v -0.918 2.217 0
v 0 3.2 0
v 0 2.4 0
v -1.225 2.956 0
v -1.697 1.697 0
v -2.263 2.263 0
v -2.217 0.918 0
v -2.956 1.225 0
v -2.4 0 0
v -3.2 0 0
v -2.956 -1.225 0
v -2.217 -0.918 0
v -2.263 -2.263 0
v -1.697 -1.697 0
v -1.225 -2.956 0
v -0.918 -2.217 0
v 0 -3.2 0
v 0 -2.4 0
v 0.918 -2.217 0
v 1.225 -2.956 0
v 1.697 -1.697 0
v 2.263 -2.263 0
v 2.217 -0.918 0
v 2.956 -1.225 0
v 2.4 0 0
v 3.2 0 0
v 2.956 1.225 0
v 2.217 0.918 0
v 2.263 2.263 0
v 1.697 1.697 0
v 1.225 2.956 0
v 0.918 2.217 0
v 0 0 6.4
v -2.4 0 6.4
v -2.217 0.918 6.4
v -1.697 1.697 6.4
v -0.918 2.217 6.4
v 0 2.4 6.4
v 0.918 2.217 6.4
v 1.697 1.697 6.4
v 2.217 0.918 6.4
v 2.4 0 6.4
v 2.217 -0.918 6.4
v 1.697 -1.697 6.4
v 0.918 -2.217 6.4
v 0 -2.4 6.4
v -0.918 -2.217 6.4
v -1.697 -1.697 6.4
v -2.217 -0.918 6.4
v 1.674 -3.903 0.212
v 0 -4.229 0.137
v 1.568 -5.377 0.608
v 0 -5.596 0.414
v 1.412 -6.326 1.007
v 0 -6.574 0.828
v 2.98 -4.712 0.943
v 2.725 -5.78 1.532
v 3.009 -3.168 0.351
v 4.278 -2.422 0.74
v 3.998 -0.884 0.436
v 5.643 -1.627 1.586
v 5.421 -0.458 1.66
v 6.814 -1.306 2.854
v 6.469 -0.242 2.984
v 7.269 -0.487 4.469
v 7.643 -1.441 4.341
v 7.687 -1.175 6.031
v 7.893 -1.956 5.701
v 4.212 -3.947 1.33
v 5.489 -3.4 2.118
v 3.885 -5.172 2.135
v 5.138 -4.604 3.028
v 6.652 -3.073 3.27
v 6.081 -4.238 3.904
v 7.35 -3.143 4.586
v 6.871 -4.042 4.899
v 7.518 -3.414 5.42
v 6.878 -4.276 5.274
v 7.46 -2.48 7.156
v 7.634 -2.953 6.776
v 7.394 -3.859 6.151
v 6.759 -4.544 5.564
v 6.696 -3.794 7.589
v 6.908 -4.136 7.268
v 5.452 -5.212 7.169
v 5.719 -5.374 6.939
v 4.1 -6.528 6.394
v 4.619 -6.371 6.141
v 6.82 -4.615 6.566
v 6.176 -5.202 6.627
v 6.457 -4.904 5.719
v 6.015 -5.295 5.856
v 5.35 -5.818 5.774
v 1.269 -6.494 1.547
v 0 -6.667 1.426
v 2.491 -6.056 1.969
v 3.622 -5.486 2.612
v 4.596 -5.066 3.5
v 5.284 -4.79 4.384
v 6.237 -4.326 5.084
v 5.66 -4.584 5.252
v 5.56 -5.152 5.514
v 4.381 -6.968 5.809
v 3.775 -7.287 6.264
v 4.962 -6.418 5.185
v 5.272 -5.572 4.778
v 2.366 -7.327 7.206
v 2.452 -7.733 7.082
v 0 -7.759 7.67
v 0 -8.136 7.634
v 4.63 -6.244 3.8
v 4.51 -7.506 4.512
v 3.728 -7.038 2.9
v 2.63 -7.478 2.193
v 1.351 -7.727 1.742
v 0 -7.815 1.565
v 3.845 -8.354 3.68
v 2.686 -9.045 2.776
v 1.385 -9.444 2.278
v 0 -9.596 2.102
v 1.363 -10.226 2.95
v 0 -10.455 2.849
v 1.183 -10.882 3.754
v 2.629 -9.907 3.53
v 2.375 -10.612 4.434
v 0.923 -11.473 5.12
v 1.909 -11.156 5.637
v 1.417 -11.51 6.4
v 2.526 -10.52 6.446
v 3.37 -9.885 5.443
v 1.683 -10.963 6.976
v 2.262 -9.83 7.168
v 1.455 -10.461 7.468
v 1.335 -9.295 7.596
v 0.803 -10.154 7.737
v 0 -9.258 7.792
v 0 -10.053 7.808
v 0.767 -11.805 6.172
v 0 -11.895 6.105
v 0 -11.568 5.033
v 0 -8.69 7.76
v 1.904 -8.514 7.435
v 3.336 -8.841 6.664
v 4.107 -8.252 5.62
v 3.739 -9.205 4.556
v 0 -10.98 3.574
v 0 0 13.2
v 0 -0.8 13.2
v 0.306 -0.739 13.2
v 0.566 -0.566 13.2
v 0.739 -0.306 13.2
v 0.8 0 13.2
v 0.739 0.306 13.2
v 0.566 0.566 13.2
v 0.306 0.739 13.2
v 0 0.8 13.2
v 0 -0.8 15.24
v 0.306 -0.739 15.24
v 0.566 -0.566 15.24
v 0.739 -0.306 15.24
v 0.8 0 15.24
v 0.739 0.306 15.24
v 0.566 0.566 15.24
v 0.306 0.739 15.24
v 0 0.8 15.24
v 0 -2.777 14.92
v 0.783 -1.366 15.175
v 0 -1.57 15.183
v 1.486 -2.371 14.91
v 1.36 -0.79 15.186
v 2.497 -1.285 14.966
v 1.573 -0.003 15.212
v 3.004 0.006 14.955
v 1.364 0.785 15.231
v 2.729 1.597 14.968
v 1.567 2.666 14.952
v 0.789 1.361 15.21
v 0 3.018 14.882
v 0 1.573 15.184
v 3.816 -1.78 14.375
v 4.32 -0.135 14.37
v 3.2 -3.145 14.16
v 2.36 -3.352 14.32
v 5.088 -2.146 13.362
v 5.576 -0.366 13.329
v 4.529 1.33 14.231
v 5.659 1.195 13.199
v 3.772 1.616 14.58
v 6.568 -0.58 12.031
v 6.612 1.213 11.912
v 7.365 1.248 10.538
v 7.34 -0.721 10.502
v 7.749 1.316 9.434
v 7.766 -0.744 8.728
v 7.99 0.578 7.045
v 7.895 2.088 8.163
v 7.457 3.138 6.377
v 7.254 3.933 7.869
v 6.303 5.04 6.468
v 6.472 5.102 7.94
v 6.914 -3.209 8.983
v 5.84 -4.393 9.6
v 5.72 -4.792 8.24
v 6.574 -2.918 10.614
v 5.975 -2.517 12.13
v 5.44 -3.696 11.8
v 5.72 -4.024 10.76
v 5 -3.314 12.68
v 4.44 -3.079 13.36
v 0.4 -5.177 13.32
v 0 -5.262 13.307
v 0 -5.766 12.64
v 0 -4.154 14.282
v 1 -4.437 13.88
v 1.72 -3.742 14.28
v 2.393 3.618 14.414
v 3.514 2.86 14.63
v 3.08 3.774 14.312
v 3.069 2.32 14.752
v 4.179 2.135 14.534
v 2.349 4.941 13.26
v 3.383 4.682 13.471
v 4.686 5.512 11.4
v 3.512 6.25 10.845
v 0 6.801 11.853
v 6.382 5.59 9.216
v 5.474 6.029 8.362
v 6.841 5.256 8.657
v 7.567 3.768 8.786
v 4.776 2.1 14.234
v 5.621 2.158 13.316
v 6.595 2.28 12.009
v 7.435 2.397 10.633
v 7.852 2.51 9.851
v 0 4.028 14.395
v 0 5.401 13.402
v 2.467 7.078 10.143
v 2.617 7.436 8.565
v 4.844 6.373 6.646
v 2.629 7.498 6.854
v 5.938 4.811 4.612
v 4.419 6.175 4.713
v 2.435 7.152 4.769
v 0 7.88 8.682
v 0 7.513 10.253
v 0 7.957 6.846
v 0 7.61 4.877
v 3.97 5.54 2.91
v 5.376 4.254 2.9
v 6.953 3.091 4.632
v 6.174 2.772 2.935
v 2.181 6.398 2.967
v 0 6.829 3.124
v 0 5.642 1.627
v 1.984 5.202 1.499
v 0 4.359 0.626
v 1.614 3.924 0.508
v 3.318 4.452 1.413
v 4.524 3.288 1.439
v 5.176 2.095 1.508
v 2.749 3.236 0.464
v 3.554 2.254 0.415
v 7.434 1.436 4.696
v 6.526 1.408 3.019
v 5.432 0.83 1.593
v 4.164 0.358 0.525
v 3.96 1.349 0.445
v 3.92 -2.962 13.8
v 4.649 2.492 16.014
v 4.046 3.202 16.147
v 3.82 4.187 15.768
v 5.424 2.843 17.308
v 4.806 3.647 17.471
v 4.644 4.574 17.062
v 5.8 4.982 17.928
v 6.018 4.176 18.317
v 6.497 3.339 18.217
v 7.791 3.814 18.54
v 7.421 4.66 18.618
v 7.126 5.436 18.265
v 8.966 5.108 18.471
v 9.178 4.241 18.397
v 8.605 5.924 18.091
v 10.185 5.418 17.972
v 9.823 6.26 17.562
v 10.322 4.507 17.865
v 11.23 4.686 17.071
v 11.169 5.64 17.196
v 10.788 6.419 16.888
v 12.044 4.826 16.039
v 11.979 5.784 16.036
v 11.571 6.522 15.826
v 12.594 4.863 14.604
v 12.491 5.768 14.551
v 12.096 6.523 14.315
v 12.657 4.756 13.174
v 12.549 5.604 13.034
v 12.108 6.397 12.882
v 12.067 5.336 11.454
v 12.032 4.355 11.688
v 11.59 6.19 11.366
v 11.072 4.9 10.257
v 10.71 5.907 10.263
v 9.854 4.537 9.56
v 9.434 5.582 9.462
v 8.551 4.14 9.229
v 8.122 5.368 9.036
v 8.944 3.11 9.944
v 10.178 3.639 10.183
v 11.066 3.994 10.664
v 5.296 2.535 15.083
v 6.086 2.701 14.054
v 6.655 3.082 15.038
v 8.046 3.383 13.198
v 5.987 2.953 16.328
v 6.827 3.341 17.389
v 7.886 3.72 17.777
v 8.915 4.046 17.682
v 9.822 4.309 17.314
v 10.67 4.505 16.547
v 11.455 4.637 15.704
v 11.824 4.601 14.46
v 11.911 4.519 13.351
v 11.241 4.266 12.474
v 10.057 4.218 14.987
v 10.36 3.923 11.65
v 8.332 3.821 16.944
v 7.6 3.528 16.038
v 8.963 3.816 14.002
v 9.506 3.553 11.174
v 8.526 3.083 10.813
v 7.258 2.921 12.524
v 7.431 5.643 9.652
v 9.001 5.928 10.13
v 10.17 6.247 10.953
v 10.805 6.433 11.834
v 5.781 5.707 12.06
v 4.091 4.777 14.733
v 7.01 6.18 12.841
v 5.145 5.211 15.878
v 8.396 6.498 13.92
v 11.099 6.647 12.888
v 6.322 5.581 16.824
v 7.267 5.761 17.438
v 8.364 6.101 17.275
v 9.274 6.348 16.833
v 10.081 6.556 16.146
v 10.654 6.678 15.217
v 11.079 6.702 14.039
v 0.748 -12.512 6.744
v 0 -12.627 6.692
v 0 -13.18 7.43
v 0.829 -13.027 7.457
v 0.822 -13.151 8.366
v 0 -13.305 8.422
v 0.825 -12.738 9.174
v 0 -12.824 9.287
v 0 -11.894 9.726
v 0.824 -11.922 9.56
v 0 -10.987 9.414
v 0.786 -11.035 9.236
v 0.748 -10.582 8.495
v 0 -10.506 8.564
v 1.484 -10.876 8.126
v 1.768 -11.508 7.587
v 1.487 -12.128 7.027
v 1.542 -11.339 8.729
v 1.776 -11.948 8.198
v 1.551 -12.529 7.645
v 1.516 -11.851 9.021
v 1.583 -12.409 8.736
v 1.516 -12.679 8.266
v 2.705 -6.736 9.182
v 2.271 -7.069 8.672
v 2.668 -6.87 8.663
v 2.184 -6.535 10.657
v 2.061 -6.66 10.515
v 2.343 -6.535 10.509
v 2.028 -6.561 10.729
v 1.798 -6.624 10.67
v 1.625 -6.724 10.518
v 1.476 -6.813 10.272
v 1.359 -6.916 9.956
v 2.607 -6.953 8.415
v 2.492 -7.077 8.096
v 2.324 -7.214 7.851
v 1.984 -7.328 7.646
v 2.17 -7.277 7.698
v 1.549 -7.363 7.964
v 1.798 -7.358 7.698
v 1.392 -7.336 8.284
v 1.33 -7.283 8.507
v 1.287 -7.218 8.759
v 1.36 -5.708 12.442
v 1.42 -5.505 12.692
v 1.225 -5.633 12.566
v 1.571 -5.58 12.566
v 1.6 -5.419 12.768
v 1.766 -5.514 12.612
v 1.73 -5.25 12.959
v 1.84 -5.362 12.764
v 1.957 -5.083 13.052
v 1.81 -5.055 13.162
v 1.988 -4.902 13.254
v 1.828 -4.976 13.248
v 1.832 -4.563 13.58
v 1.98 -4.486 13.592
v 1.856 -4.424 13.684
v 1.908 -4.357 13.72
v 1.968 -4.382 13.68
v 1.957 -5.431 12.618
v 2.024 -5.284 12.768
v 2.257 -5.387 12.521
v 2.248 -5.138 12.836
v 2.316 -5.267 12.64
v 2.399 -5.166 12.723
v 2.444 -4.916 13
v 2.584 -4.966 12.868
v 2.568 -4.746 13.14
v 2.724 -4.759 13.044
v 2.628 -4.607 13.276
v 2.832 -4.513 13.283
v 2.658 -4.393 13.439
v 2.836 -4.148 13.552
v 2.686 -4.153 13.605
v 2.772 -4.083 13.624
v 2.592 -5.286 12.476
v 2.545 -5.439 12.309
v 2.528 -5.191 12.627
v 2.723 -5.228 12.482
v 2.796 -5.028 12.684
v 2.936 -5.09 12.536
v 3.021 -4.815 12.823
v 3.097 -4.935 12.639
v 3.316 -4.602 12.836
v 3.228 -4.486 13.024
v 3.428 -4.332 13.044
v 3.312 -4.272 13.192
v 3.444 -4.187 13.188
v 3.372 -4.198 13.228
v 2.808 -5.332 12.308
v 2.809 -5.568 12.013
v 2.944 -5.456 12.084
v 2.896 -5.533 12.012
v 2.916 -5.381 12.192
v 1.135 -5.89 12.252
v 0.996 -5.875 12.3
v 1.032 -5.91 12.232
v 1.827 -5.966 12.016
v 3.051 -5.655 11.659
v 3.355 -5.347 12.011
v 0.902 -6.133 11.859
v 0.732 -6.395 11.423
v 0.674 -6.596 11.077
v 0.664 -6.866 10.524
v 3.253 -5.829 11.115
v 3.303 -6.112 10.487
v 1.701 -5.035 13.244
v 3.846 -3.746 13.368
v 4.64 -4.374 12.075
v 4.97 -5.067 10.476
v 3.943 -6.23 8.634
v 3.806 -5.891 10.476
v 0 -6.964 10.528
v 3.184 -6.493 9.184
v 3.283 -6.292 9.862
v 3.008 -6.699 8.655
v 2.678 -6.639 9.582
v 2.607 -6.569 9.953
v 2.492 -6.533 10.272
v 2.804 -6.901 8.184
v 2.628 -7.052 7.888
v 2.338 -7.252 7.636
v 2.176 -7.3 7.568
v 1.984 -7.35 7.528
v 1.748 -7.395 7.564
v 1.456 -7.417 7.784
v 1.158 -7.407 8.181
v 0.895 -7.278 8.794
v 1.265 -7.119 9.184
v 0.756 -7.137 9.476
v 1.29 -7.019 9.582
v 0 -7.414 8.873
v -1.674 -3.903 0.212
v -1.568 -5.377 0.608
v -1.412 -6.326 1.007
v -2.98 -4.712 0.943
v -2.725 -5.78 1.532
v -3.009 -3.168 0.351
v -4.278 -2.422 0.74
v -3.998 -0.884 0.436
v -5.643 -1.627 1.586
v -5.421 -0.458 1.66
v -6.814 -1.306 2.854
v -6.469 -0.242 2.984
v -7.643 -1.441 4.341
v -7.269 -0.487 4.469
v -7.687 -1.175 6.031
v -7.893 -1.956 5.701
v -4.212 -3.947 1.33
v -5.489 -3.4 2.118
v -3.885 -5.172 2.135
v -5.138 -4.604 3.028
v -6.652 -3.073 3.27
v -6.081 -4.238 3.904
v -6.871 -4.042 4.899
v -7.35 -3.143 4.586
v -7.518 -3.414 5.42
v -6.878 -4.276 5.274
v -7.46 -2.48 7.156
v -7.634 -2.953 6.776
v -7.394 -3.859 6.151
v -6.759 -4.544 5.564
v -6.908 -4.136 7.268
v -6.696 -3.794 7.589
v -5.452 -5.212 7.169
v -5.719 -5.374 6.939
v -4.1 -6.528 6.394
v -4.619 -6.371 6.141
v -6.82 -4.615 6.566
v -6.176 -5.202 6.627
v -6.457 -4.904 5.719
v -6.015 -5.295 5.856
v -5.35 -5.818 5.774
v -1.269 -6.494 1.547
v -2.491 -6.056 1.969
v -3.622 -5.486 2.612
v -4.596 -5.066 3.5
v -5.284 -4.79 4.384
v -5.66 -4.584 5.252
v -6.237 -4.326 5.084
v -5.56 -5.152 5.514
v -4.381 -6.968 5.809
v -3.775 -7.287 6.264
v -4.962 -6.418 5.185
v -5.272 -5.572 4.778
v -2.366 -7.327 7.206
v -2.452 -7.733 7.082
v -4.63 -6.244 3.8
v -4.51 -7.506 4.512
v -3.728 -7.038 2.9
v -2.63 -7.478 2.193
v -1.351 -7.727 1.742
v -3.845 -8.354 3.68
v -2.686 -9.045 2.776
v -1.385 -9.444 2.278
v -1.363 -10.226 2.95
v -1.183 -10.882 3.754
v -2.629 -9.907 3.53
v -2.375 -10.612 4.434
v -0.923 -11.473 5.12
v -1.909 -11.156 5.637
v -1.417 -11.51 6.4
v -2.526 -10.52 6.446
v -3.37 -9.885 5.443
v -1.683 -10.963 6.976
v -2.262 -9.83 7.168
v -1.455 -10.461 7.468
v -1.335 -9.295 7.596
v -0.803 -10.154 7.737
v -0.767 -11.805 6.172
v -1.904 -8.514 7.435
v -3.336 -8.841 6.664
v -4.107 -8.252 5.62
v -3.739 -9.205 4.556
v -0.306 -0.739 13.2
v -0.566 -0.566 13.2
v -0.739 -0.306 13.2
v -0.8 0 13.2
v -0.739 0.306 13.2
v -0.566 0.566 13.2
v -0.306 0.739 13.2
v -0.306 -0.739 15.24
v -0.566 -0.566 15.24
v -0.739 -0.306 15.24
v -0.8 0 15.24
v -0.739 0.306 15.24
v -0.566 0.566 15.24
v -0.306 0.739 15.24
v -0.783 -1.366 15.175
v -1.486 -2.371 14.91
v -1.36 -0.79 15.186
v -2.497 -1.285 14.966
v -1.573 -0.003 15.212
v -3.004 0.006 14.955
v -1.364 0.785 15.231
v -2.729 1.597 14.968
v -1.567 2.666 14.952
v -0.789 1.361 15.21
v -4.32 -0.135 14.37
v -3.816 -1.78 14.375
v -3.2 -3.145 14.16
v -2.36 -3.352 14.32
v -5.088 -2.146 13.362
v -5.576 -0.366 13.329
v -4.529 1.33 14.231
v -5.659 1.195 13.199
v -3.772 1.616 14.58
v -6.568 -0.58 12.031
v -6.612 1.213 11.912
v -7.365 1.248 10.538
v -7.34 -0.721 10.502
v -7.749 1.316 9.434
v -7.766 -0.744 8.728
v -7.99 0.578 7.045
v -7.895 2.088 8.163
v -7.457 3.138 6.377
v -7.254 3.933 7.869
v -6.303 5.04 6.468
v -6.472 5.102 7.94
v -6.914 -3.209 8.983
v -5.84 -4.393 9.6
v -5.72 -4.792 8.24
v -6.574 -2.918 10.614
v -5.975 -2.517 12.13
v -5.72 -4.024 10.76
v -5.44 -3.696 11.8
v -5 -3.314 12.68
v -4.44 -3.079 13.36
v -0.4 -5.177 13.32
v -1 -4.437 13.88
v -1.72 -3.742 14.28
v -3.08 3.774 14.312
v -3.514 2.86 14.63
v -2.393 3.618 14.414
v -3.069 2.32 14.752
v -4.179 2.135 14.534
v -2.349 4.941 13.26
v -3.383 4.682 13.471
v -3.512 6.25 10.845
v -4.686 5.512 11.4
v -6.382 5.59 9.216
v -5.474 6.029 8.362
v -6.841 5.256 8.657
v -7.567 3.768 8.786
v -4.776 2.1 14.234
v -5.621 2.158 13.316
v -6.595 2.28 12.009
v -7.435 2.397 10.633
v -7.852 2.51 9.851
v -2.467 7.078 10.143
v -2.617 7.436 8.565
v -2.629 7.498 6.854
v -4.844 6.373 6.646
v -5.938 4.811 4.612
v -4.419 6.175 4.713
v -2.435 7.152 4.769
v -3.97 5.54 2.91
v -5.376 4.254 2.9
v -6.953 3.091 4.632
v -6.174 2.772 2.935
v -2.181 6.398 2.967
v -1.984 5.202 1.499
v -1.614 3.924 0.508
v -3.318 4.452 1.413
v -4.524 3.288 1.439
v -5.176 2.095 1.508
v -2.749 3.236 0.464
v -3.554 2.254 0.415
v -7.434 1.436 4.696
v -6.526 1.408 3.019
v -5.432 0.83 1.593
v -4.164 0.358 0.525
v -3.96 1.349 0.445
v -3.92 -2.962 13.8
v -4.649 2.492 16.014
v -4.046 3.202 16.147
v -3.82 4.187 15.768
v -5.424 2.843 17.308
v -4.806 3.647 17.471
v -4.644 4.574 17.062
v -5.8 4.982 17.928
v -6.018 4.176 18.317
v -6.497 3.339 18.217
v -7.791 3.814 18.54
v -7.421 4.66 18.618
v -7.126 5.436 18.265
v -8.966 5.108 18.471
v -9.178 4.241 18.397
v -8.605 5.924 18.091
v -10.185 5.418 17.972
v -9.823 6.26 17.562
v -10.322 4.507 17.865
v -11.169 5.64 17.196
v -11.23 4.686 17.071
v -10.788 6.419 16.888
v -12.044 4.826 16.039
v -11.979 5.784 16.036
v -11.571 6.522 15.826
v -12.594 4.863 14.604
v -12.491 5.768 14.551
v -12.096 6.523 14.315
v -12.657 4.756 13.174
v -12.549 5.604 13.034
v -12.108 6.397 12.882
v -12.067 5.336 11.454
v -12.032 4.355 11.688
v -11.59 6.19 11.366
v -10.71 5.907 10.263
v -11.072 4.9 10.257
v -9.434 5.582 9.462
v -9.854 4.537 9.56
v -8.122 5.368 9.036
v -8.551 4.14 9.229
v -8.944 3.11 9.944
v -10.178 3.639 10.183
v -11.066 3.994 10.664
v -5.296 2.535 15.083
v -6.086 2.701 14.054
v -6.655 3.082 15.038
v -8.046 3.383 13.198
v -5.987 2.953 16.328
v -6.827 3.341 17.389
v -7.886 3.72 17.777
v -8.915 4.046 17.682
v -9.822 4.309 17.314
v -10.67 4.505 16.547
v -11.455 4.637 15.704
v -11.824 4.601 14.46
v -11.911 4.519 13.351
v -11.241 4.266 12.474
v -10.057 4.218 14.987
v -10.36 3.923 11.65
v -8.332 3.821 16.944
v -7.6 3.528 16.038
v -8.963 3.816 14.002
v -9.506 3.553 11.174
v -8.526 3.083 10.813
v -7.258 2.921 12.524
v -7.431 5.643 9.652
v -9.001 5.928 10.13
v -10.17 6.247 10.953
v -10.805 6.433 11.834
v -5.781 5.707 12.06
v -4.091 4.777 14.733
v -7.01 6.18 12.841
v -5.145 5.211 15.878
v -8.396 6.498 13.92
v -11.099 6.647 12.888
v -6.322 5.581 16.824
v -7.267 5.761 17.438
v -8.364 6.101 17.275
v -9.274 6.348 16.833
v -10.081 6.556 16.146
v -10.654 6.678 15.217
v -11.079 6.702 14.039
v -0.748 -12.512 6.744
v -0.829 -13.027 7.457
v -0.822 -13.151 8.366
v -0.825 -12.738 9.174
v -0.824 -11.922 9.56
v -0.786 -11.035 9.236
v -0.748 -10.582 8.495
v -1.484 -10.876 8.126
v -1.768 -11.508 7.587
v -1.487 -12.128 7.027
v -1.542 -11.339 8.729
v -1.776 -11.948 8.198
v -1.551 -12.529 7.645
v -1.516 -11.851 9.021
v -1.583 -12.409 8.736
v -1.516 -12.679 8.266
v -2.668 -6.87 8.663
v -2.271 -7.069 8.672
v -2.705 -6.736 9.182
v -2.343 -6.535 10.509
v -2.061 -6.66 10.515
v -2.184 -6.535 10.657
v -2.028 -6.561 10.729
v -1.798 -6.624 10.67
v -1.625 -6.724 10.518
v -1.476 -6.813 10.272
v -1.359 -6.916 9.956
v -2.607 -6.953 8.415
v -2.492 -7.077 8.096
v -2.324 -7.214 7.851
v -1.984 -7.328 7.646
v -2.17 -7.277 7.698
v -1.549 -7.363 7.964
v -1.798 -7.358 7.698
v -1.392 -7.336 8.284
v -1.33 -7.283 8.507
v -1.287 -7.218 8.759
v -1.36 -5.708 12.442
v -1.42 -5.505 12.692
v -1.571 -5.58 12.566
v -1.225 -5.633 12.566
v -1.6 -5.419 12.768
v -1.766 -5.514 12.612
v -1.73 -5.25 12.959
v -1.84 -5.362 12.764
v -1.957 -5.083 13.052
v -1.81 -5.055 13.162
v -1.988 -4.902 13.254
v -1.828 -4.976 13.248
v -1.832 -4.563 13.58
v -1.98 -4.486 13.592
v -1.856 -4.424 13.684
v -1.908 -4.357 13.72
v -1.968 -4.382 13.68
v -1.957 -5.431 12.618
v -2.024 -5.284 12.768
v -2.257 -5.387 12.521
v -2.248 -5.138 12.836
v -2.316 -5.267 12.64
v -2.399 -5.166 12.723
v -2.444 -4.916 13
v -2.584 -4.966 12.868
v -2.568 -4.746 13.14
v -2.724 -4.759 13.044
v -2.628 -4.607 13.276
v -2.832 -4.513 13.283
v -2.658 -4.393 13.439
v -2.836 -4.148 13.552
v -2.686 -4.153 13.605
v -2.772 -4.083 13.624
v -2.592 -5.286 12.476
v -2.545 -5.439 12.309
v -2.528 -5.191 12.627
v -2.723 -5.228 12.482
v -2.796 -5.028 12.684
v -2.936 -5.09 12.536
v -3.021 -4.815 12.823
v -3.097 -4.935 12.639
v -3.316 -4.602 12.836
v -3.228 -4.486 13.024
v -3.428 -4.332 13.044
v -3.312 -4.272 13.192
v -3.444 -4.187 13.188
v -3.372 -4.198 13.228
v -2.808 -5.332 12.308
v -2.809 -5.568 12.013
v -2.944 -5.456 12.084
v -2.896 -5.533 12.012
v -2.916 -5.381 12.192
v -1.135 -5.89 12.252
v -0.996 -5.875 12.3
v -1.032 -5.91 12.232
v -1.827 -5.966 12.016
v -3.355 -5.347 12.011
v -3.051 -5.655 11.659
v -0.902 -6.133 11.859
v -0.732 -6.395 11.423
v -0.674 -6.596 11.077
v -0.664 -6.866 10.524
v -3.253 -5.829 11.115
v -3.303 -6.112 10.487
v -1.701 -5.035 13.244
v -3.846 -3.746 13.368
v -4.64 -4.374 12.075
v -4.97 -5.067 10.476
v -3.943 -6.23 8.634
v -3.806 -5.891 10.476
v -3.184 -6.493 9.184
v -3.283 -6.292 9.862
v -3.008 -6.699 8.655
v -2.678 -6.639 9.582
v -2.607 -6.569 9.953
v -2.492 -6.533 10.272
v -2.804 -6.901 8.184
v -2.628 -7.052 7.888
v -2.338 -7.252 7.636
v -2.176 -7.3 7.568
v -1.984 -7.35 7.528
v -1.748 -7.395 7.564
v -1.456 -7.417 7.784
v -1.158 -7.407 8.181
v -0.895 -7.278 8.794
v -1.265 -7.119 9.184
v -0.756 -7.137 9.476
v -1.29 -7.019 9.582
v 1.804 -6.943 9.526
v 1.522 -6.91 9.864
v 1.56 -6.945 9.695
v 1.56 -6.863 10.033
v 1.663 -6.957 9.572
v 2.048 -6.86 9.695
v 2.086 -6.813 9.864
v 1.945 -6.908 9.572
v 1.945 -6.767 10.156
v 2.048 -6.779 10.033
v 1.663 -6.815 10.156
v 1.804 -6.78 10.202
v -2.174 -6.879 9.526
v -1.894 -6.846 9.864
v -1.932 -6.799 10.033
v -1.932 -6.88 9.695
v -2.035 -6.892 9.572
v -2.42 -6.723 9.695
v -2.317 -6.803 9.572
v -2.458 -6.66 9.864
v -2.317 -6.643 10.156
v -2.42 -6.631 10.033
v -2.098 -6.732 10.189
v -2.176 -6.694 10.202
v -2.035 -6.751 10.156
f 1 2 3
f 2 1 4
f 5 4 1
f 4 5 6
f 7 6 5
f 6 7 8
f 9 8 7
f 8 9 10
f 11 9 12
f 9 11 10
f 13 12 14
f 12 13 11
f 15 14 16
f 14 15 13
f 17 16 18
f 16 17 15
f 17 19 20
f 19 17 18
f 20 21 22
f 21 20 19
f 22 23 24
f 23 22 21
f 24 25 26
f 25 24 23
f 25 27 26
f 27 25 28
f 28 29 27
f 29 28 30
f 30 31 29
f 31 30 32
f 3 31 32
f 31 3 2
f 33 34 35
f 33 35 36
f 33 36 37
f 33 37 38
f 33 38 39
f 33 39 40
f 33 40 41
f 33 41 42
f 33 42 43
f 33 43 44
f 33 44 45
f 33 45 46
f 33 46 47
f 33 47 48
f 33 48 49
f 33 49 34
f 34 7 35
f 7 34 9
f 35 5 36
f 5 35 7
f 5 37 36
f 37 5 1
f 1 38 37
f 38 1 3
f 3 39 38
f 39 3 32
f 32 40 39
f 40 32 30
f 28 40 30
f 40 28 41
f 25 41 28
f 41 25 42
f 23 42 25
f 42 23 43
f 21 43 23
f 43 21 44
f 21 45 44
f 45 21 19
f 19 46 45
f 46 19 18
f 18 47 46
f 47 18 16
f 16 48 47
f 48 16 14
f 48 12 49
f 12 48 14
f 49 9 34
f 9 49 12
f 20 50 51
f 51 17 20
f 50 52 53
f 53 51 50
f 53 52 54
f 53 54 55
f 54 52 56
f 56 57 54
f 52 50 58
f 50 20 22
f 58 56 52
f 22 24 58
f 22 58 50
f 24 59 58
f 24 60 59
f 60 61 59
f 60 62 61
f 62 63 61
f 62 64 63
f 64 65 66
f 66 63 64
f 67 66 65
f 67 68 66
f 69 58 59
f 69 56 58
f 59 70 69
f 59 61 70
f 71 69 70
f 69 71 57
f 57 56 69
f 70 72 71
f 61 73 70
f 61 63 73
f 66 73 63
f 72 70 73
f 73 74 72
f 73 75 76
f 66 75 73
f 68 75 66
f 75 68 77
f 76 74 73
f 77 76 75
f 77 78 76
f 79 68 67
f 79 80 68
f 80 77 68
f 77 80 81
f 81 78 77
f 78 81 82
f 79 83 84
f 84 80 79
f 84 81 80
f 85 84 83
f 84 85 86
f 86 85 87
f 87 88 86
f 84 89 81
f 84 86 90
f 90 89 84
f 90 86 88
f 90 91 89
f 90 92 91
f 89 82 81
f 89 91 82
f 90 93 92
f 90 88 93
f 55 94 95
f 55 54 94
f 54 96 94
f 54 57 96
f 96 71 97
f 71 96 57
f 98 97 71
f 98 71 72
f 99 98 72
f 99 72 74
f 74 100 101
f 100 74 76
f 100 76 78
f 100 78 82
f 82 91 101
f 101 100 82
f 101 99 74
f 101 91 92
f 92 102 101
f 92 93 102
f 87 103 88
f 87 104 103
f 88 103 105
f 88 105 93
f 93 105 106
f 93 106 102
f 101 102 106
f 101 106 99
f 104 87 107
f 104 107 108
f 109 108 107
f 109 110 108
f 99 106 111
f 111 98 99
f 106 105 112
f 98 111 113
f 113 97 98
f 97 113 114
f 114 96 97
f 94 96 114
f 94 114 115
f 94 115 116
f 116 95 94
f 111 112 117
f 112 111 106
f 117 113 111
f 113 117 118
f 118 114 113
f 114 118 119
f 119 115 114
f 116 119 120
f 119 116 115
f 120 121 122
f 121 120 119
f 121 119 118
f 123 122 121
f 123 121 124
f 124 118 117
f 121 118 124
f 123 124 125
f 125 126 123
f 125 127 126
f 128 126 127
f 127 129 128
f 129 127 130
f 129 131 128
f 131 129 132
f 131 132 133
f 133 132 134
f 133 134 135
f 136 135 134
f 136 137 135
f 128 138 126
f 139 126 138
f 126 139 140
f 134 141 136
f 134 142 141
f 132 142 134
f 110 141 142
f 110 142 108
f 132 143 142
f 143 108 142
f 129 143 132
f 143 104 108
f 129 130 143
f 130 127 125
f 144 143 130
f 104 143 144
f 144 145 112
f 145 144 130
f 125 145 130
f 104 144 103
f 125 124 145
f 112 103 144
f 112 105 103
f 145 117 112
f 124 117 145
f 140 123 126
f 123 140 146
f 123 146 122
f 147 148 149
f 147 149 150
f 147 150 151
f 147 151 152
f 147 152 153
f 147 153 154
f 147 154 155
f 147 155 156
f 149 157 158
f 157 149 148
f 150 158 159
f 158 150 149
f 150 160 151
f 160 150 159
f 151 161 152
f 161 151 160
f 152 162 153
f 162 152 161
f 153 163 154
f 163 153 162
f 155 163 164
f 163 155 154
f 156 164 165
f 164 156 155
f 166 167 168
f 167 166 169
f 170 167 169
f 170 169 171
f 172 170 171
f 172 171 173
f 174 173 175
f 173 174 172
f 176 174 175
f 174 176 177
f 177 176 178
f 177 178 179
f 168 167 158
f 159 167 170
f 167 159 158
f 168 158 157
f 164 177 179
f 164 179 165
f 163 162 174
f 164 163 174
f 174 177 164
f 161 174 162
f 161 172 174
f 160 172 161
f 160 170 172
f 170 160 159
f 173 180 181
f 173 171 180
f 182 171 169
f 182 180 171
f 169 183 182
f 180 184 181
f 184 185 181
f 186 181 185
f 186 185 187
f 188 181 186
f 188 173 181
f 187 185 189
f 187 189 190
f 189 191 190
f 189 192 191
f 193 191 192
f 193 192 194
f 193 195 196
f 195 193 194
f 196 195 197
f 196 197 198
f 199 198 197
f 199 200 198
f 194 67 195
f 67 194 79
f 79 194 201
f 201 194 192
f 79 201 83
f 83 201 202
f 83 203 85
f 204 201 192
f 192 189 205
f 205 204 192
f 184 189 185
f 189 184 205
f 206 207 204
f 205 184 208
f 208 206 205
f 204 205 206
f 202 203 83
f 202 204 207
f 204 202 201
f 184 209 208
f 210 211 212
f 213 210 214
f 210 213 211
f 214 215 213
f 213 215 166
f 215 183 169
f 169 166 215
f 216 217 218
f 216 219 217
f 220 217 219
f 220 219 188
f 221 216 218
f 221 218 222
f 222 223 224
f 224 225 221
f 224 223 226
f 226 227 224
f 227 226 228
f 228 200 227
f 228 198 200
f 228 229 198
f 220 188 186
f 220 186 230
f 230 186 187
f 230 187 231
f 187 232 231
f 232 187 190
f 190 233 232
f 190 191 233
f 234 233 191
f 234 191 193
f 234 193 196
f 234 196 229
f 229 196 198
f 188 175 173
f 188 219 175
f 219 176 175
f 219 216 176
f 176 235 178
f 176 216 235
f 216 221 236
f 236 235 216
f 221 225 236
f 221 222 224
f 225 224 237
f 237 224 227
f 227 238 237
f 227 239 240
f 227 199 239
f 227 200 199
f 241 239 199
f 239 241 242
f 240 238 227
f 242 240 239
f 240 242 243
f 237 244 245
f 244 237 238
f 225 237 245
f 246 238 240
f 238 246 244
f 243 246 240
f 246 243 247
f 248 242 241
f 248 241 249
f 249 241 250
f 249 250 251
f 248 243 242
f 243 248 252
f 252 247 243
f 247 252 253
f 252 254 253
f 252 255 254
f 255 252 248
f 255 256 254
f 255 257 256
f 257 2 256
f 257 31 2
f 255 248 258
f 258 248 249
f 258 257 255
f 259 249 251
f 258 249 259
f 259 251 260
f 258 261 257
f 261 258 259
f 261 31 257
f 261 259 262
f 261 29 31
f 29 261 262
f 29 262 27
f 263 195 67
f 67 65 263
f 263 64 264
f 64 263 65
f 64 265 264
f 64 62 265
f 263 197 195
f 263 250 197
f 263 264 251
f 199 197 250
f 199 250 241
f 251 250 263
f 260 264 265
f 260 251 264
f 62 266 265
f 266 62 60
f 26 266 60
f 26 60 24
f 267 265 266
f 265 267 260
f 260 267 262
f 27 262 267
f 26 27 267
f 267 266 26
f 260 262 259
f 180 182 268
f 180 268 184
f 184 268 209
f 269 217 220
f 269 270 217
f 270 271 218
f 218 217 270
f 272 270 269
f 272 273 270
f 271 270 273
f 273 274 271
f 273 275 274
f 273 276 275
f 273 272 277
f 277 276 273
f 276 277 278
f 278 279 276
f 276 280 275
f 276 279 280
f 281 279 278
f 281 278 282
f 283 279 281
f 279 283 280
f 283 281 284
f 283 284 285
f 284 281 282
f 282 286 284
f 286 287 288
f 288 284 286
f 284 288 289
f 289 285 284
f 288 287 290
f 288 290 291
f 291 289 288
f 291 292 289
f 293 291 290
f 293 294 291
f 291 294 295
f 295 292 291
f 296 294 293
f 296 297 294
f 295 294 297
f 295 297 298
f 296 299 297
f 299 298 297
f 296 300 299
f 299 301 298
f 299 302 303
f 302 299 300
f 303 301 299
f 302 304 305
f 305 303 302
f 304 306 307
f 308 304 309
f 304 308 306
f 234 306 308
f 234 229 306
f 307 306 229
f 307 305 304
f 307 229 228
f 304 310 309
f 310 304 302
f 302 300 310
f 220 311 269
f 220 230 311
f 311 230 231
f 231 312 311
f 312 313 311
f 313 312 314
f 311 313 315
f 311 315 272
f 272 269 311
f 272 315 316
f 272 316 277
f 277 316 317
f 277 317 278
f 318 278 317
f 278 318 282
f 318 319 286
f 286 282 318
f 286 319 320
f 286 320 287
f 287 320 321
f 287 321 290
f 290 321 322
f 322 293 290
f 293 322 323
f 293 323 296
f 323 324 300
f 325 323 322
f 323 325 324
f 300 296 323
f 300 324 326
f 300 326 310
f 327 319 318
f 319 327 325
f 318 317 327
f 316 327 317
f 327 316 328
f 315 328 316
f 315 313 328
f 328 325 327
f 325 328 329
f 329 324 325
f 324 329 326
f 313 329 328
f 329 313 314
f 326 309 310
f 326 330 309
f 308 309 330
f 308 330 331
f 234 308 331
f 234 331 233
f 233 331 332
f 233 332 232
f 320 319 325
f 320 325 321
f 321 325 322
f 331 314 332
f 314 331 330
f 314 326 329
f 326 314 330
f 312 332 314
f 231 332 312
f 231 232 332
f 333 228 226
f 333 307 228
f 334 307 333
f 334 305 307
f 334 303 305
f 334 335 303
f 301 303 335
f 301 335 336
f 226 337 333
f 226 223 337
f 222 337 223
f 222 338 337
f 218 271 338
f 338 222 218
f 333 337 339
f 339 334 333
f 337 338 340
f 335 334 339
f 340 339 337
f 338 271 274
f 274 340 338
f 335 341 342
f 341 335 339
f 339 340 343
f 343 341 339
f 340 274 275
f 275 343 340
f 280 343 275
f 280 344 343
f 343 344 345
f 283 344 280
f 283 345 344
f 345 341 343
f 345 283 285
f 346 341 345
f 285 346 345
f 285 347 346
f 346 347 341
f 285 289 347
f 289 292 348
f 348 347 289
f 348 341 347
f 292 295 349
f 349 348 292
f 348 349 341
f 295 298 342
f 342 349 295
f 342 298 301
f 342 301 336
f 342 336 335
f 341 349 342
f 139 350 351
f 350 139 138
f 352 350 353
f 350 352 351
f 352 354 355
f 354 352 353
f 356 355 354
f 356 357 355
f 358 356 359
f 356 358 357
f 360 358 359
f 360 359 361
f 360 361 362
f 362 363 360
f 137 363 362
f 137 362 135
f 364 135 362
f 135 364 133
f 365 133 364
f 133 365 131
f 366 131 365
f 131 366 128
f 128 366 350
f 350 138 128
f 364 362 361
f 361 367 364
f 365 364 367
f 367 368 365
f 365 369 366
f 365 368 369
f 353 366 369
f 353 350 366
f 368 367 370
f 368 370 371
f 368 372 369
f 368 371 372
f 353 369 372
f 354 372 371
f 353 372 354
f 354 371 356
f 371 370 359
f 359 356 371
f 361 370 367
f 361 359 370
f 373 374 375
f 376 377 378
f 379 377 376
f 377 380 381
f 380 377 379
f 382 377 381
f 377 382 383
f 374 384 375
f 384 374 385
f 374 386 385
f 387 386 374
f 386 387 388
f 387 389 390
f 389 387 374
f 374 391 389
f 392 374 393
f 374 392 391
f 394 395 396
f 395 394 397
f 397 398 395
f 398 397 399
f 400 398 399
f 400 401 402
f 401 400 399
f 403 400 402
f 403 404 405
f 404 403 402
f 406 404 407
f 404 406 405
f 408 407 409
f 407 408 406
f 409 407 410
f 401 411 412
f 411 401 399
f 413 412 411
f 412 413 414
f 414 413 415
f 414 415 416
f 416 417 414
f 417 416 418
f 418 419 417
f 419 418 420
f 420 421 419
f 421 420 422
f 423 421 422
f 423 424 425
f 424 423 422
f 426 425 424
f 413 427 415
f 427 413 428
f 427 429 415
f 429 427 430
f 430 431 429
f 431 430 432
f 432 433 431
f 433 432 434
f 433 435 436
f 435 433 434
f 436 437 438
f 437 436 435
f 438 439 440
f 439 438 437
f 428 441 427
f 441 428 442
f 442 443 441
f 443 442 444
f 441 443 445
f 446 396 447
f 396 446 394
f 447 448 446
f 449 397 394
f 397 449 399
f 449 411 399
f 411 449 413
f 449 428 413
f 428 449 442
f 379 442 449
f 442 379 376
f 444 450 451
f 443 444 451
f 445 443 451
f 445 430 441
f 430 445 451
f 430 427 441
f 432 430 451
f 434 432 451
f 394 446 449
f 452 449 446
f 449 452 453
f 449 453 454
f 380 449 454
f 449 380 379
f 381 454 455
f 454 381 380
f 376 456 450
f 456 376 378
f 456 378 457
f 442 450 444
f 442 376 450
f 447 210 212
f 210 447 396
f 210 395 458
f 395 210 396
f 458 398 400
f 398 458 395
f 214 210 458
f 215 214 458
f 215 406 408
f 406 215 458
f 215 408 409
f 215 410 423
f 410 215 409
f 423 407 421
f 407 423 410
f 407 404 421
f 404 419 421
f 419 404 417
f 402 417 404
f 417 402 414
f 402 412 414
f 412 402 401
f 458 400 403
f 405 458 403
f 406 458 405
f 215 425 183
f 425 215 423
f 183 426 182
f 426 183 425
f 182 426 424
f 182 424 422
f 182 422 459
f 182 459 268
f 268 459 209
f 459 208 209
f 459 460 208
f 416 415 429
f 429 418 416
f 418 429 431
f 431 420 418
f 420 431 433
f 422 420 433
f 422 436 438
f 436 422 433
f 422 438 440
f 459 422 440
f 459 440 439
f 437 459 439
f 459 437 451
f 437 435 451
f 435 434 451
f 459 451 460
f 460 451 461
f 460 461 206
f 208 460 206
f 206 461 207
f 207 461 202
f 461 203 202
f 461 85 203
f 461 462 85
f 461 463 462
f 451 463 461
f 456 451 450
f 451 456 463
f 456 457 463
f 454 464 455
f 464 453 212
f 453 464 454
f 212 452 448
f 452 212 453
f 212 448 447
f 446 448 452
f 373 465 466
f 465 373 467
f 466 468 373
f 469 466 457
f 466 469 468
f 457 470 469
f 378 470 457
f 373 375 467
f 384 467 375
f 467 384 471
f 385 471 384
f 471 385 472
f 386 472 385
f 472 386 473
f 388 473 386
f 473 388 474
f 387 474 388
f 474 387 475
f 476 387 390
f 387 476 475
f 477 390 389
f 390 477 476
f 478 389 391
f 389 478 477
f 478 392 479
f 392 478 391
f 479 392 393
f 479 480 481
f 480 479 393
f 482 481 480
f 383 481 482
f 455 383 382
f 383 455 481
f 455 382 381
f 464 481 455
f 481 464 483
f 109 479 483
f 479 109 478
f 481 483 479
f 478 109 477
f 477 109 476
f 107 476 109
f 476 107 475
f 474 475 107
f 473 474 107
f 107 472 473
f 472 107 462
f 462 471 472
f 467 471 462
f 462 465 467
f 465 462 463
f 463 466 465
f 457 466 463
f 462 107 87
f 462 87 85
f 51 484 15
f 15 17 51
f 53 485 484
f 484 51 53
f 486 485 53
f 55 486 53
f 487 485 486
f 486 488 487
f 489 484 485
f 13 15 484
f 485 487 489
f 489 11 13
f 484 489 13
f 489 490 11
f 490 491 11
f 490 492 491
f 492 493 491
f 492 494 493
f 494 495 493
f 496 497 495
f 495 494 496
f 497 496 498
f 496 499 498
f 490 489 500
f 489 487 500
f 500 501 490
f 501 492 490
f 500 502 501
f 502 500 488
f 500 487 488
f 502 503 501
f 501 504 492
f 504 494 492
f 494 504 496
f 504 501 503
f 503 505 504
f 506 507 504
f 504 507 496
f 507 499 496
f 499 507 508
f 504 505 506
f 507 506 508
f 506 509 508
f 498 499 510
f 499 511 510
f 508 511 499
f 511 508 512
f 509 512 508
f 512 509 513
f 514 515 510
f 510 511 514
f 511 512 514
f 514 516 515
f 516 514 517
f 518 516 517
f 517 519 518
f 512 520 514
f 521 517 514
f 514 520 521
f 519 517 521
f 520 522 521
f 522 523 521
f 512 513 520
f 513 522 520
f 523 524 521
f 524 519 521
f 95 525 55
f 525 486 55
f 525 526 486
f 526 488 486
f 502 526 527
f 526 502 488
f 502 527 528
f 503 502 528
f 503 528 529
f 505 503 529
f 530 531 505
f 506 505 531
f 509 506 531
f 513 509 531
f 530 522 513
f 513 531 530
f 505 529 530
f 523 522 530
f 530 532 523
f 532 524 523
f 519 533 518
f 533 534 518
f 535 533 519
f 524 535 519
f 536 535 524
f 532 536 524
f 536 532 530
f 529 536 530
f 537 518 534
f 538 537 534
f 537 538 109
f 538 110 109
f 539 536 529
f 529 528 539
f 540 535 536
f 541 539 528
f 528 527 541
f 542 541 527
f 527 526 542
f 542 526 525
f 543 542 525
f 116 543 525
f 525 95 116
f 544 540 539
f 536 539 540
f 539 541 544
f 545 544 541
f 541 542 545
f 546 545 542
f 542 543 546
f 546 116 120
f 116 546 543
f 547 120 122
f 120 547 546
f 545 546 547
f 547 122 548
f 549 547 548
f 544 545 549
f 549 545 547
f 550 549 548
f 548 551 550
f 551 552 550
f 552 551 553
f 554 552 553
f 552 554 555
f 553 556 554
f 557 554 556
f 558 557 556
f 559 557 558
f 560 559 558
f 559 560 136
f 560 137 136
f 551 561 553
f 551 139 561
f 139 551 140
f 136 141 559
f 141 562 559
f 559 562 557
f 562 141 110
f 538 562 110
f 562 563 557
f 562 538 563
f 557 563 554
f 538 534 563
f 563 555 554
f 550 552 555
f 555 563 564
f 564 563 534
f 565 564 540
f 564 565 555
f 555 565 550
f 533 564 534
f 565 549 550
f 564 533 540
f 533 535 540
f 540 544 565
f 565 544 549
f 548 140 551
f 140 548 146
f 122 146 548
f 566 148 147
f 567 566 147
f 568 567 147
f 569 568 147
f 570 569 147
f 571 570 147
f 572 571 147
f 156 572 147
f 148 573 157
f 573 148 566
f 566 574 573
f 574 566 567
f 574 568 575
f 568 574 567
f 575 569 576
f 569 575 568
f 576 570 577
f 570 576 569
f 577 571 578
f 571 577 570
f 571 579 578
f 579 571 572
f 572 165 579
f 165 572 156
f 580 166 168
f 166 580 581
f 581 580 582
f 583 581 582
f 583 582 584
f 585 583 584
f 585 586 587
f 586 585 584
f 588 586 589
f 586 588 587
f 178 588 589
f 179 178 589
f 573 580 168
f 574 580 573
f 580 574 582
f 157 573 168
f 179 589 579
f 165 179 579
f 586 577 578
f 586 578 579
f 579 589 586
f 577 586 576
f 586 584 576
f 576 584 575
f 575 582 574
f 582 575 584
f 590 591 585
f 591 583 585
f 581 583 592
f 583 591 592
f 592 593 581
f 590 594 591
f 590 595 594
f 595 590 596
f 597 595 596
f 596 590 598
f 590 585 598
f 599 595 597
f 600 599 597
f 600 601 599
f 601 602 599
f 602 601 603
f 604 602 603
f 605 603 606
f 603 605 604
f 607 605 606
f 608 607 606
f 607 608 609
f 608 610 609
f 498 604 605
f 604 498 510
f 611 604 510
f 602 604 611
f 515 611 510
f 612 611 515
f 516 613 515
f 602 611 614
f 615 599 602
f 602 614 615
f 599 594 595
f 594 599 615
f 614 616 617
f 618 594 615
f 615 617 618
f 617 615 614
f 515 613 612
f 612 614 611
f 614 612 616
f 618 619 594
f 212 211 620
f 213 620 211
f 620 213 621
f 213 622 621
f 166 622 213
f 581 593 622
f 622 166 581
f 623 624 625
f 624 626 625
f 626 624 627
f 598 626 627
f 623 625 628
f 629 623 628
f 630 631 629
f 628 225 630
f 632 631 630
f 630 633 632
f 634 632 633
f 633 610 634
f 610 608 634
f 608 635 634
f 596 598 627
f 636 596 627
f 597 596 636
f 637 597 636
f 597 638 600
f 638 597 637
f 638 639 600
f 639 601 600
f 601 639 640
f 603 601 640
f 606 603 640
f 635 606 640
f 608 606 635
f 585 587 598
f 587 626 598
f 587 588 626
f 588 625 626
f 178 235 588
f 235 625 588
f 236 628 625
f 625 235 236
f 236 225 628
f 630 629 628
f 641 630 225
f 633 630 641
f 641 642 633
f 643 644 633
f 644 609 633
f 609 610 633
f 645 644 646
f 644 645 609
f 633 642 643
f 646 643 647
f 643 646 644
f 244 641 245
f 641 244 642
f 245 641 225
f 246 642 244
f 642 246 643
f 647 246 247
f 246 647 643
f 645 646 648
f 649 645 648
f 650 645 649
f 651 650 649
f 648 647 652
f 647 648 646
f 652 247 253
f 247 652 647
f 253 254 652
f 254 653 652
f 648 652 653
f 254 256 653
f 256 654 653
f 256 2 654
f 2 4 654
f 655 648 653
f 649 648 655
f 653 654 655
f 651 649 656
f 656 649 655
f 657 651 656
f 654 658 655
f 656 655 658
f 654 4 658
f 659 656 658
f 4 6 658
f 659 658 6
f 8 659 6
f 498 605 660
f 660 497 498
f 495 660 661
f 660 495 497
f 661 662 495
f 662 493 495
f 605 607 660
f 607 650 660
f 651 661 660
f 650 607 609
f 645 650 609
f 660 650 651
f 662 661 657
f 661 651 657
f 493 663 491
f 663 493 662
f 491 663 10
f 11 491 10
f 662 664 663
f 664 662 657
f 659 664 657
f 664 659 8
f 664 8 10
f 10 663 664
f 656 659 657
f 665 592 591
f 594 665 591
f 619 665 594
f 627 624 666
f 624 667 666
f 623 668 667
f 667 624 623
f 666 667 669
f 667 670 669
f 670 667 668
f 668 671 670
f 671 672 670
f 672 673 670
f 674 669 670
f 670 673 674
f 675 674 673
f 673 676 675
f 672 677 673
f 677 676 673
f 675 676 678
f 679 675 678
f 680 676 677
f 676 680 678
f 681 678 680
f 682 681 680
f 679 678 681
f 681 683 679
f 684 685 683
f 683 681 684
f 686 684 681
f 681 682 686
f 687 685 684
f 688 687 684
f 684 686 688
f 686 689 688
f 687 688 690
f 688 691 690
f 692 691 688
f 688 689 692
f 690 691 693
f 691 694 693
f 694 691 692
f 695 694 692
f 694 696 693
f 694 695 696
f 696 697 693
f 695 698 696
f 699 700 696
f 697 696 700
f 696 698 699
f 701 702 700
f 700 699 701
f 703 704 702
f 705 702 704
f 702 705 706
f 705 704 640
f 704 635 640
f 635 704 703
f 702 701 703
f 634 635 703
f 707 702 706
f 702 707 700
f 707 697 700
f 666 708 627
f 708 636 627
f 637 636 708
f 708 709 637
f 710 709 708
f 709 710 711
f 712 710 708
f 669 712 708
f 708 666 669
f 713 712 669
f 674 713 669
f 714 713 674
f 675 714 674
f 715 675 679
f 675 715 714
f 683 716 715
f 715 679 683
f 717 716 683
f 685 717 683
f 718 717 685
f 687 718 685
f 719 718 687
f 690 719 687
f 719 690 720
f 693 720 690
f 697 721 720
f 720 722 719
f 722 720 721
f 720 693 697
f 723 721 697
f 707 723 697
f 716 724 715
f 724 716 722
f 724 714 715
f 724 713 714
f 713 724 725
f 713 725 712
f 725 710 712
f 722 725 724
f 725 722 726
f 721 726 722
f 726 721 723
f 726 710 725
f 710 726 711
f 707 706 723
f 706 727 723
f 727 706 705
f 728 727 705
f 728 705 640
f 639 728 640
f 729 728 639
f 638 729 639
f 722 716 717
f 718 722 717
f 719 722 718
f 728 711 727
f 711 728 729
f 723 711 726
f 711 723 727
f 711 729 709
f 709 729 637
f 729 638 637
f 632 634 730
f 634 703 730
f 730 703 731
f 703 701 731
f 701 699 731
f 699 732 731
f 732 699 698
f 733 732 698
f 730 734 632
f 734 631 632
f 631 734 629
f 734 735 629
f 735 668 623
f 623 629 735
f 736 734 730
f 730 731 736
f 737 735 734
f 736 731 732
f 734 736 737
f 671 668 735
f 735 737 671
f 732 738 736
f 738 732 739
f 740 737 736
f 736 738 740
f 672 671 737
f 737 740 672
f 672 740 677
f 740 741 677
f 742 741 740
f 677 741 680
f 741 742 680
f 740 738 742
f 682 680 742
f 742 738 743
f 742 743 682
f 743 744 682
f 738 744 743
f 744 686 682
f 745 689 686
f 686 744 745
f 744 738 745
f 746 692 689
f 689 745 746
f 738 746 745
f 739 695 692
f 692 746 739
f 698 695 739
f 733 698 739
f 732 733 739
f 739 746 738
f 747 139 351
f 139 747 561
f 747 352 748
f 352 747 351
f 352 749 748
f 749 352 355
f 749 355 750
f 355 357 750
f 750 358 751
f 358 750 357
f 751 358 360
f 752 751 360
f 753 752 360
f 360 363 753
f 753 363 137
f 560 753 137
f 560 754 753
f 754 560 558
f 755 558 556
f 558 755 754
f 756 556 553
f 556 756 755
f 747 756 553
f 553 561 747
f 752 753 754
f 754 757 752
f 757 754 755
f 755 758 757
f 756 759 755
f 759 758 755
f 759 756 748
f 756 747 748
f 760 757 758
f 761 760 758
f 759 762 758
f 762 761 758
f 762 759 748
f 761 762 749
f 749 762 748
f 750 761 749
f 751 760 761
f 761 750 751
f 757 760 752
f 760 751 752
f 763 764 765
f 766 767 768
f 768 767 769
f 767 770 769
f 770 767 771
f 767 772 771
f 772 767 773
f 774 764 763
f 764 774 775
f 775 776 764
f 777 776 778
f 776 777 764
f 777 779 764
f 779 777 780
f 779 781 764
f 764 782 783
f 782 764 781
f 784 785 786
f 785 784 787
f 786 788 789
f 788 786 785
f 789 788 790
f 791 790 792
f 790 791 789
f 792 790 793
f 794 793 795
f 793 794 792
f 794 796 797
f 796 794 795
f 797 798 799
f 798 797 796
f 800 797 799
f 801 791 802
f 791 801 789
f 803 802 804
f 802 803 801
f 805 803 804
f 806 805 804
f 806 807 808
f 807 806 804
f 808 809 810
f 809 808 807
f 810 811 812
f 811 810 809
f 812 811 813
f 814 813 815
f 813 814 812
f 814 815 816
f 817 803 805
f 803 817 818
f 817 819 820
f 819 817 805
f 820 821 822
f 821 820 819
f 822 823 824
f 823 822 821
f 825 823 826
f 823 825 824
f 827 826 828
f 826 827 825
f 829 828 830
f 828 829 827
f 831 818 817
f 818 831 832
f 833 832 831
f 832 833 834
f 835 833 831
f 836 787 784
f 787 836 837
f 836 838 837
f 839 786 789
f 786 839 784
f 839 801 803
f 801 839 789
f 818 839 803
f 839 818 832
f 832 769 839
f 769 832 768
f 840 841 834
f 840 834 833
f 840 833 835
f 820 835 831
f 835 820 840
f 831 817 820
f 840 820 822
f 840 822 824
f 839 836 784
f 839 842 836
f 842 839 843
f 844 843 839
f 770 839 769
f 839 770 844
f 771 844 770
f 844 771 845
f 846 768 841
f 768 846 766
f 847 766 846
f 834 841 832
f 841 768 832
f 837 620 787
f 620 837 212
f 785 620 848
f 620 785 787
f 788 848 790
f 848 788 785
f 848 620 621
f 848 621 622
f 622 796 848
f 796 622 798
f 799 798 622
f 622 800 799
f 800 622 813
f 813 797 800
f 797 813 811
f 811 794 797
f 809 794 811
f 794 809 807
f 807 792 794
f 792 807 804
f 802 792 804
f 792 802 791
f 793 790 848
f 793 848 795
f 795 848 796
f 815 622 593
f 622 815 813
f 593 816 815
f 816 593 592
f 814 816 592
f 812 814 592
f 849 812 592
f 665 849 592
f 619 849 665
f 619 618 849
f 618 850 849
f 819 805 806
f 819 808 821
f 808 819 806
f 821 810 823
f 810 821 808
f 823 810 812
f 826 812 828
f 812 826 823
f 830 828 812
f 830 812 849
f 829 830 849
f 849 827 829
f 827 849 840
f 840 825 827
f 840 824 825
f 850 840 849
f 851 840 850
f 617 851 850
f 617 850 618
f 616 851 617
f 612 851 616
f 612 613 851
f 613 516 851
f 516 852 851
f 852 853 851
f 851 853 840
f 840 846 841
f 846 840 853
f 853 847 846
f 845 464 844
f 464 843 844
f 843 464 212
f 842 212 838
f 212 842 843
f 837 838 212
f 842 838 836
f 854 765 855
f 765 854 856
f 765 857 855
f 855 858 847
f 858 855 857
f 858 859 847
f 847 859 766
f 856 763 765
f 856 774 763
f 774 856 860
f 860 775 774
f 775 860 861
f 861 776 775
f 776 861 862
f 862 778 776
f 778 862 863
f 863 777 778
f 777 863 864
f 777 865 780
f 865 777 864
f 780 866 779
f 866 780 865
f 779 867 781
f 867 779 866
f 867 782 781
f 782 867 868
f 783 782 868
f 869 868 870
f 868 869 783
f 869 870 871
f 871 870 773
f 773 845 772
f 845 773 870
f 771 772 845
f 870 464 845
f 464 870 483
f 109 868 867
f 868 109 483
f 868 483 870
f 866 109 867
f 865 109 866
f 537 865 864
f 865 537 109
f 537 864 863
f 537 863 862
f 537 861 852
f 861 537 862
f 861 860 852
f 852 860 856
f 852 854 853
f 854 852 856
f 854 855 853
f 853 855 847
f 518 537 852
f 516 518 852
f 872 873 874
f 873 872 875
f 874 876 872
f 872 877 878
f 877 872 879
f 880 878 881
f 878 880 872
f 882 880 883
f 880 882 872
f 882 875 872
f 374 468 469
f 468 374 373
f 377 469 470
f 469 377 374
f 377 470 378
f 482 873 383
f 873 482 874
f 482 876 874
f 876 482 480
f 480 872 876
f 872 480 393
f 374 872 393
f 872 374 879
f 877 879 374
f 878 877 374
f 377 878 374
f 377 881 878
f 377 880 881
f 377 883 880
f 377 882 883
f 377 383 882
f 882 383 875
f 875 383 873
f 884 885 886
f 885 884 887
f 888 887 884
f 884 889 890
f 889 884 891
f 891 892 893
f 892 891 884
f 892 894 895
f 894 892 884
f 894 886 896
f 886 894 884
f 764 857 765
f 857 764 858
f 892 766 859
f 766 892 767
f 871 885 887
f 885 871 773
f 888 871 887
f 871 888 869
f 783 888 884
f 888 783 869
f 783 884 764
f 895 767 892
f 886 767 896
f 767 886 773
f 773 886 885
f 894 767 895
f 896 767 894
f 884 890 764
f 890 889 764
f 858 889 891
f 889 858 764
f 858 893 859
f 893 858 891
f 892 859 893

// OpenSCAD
use <../lib.scad>
use <s/24629p01s06.scad>
use <s/24629p02s05.scad>
use <s/24629s01.scad>
use <s/24629s02.scad>
use <s/24629s03.scad>
use <s/24629s04.scad>
use <../p/stud4o.scad>
function ldraw_lib__24629p02() = [
// 0 Minifig Head Mouse with Black Ears, Nose and Eyelashes and Skull and Eyes with Black Pupil with White Highlight Pattern
// 0 Name: 24629p02.dat
// 0 Author: Philippe Hurbain [Philo]
// 0 !LDRAW_ORG Part UPDATE 2024-05
// 0 !LICENSE Licensed under CC BY 4.0 : see CAreadme.txt
// 
// 0 BFC CERTIFY CCW
  [0,"BFC","CERTIFY"],
  [0,"BFC","CCW"],
// 
// 0 !KEYWORDS Bricklink 24629pb02, Disney, Minnie, Set 10773, set 71040, Set 71044
// 
// 0 !HISTORY 2022-02-06 {LEGO Instructions App} Original part shape
// 0 !HISTORY 2022-02-07 [Philo] File preparation for LDraw Parts Tracker
// 0 !HISTORY 2024-06-30 [OrionP] Official Update 2024-05
// 
// 
// 1 16 0 -16 0 1 0 0 0 -4 0 0 0 1 stud4o.dat
  [1,16,0,-16,0,1,0,0,0,-4,0,0,0,1, ldraw_lib__stud4o()],
// 1 16 0 0 0 1 0 0 0 1 0 0 0 1 s\24629s01.dat
  [1,16,0,0,0,1,0,0,0,1,0,0,0,1, ldraw_lib__s__24629s01()],
// 1 0 0 0 0 1 0 0 0 1 0 0 0 1 s\24629s02.dat
  [1,0,0,0,0,1,0,0,0,1,0,0,0,1, ldraw_lib__s__24629s02()],
// 1 0 0 0 0 1 0 0 0 1 0 0 0 1 s\24629s03.dat
  [1,0,0,0,0,1,0,0,0,1,0,0,0,1, ldraw_lib__s__24629s03()],
// 1 0 0 0 0 1 0 0 0 1 0 0 0 1 s\24629s04.dat
  [1,0,0,0,0,1,0,0,0,1,0,0,0,1, ldraw_lib__s__24629s04()],
// 1 16 0 0 0 1 0 0 0 1 0 0 0 1 s\24629p02s05.dat
  [1,16,0,0,0,1,0,0,0,1,0,0,0,1, ldraw_lib__s__24629p02s05()],
// 1 16 0 0 0 -1 0 0 0 1 0 0 0 1 s\24629s01.dat
  [1,16,0,0,0,-1,0,0,0,1,0,0,0,1, ldraw_lib__s__24629s01()],
// 1 0 0 0 0 -1 0 0 0 1 0 0 0 1 s\24629s02.dat
  [1,0,0,0,0,-1,0,0,0,1,0,0,0,1, ldraw_lib__s__24629s02()],
// 1 0 0 0 0 -1 0 0 0 1 0 0 0 1 s\24629s03.dat
  [1,0,0,0,0,-1,0,0,0,1,0,0,0,1, ldraw_lib__s__24629s03()],
// 1 0 0 0 0 -1 0 0 0 1 0 0 0 1 s\24629s04.dat
  [1,0,0,0,0,-1,0,0,0,1,0,0,0,1, ldraw_lib__s__24629s04()],
// 1 16 0 0 0 -1 0 0 0 1 0 0 0 1 s\24629p02s05.dat
  [1,16,0,0,0,-1,0,0,0,1,0,0,0,1, ldraw_lib__s__24629p02s05()],
// 1 15 0 0 0 1 0 0 0 1 0 0 0 1 s\24629p01s06.dat
  [1,15,0,0,0,1,0,0,0,1,0,0,0,1, ldraw_lib__s__24629p01s06()],
];
module ldraw_lib__24629p02(step=0, col=false, unit=2/5, alt=false, line=0.2, solid=!$preview)
    makepoly(ldraw_lib__24629p02(), step=step, col=col, unit=unit, alt=alt, line=line, solid=solid);
ldraw_lib__24629p02(line=0.2);
